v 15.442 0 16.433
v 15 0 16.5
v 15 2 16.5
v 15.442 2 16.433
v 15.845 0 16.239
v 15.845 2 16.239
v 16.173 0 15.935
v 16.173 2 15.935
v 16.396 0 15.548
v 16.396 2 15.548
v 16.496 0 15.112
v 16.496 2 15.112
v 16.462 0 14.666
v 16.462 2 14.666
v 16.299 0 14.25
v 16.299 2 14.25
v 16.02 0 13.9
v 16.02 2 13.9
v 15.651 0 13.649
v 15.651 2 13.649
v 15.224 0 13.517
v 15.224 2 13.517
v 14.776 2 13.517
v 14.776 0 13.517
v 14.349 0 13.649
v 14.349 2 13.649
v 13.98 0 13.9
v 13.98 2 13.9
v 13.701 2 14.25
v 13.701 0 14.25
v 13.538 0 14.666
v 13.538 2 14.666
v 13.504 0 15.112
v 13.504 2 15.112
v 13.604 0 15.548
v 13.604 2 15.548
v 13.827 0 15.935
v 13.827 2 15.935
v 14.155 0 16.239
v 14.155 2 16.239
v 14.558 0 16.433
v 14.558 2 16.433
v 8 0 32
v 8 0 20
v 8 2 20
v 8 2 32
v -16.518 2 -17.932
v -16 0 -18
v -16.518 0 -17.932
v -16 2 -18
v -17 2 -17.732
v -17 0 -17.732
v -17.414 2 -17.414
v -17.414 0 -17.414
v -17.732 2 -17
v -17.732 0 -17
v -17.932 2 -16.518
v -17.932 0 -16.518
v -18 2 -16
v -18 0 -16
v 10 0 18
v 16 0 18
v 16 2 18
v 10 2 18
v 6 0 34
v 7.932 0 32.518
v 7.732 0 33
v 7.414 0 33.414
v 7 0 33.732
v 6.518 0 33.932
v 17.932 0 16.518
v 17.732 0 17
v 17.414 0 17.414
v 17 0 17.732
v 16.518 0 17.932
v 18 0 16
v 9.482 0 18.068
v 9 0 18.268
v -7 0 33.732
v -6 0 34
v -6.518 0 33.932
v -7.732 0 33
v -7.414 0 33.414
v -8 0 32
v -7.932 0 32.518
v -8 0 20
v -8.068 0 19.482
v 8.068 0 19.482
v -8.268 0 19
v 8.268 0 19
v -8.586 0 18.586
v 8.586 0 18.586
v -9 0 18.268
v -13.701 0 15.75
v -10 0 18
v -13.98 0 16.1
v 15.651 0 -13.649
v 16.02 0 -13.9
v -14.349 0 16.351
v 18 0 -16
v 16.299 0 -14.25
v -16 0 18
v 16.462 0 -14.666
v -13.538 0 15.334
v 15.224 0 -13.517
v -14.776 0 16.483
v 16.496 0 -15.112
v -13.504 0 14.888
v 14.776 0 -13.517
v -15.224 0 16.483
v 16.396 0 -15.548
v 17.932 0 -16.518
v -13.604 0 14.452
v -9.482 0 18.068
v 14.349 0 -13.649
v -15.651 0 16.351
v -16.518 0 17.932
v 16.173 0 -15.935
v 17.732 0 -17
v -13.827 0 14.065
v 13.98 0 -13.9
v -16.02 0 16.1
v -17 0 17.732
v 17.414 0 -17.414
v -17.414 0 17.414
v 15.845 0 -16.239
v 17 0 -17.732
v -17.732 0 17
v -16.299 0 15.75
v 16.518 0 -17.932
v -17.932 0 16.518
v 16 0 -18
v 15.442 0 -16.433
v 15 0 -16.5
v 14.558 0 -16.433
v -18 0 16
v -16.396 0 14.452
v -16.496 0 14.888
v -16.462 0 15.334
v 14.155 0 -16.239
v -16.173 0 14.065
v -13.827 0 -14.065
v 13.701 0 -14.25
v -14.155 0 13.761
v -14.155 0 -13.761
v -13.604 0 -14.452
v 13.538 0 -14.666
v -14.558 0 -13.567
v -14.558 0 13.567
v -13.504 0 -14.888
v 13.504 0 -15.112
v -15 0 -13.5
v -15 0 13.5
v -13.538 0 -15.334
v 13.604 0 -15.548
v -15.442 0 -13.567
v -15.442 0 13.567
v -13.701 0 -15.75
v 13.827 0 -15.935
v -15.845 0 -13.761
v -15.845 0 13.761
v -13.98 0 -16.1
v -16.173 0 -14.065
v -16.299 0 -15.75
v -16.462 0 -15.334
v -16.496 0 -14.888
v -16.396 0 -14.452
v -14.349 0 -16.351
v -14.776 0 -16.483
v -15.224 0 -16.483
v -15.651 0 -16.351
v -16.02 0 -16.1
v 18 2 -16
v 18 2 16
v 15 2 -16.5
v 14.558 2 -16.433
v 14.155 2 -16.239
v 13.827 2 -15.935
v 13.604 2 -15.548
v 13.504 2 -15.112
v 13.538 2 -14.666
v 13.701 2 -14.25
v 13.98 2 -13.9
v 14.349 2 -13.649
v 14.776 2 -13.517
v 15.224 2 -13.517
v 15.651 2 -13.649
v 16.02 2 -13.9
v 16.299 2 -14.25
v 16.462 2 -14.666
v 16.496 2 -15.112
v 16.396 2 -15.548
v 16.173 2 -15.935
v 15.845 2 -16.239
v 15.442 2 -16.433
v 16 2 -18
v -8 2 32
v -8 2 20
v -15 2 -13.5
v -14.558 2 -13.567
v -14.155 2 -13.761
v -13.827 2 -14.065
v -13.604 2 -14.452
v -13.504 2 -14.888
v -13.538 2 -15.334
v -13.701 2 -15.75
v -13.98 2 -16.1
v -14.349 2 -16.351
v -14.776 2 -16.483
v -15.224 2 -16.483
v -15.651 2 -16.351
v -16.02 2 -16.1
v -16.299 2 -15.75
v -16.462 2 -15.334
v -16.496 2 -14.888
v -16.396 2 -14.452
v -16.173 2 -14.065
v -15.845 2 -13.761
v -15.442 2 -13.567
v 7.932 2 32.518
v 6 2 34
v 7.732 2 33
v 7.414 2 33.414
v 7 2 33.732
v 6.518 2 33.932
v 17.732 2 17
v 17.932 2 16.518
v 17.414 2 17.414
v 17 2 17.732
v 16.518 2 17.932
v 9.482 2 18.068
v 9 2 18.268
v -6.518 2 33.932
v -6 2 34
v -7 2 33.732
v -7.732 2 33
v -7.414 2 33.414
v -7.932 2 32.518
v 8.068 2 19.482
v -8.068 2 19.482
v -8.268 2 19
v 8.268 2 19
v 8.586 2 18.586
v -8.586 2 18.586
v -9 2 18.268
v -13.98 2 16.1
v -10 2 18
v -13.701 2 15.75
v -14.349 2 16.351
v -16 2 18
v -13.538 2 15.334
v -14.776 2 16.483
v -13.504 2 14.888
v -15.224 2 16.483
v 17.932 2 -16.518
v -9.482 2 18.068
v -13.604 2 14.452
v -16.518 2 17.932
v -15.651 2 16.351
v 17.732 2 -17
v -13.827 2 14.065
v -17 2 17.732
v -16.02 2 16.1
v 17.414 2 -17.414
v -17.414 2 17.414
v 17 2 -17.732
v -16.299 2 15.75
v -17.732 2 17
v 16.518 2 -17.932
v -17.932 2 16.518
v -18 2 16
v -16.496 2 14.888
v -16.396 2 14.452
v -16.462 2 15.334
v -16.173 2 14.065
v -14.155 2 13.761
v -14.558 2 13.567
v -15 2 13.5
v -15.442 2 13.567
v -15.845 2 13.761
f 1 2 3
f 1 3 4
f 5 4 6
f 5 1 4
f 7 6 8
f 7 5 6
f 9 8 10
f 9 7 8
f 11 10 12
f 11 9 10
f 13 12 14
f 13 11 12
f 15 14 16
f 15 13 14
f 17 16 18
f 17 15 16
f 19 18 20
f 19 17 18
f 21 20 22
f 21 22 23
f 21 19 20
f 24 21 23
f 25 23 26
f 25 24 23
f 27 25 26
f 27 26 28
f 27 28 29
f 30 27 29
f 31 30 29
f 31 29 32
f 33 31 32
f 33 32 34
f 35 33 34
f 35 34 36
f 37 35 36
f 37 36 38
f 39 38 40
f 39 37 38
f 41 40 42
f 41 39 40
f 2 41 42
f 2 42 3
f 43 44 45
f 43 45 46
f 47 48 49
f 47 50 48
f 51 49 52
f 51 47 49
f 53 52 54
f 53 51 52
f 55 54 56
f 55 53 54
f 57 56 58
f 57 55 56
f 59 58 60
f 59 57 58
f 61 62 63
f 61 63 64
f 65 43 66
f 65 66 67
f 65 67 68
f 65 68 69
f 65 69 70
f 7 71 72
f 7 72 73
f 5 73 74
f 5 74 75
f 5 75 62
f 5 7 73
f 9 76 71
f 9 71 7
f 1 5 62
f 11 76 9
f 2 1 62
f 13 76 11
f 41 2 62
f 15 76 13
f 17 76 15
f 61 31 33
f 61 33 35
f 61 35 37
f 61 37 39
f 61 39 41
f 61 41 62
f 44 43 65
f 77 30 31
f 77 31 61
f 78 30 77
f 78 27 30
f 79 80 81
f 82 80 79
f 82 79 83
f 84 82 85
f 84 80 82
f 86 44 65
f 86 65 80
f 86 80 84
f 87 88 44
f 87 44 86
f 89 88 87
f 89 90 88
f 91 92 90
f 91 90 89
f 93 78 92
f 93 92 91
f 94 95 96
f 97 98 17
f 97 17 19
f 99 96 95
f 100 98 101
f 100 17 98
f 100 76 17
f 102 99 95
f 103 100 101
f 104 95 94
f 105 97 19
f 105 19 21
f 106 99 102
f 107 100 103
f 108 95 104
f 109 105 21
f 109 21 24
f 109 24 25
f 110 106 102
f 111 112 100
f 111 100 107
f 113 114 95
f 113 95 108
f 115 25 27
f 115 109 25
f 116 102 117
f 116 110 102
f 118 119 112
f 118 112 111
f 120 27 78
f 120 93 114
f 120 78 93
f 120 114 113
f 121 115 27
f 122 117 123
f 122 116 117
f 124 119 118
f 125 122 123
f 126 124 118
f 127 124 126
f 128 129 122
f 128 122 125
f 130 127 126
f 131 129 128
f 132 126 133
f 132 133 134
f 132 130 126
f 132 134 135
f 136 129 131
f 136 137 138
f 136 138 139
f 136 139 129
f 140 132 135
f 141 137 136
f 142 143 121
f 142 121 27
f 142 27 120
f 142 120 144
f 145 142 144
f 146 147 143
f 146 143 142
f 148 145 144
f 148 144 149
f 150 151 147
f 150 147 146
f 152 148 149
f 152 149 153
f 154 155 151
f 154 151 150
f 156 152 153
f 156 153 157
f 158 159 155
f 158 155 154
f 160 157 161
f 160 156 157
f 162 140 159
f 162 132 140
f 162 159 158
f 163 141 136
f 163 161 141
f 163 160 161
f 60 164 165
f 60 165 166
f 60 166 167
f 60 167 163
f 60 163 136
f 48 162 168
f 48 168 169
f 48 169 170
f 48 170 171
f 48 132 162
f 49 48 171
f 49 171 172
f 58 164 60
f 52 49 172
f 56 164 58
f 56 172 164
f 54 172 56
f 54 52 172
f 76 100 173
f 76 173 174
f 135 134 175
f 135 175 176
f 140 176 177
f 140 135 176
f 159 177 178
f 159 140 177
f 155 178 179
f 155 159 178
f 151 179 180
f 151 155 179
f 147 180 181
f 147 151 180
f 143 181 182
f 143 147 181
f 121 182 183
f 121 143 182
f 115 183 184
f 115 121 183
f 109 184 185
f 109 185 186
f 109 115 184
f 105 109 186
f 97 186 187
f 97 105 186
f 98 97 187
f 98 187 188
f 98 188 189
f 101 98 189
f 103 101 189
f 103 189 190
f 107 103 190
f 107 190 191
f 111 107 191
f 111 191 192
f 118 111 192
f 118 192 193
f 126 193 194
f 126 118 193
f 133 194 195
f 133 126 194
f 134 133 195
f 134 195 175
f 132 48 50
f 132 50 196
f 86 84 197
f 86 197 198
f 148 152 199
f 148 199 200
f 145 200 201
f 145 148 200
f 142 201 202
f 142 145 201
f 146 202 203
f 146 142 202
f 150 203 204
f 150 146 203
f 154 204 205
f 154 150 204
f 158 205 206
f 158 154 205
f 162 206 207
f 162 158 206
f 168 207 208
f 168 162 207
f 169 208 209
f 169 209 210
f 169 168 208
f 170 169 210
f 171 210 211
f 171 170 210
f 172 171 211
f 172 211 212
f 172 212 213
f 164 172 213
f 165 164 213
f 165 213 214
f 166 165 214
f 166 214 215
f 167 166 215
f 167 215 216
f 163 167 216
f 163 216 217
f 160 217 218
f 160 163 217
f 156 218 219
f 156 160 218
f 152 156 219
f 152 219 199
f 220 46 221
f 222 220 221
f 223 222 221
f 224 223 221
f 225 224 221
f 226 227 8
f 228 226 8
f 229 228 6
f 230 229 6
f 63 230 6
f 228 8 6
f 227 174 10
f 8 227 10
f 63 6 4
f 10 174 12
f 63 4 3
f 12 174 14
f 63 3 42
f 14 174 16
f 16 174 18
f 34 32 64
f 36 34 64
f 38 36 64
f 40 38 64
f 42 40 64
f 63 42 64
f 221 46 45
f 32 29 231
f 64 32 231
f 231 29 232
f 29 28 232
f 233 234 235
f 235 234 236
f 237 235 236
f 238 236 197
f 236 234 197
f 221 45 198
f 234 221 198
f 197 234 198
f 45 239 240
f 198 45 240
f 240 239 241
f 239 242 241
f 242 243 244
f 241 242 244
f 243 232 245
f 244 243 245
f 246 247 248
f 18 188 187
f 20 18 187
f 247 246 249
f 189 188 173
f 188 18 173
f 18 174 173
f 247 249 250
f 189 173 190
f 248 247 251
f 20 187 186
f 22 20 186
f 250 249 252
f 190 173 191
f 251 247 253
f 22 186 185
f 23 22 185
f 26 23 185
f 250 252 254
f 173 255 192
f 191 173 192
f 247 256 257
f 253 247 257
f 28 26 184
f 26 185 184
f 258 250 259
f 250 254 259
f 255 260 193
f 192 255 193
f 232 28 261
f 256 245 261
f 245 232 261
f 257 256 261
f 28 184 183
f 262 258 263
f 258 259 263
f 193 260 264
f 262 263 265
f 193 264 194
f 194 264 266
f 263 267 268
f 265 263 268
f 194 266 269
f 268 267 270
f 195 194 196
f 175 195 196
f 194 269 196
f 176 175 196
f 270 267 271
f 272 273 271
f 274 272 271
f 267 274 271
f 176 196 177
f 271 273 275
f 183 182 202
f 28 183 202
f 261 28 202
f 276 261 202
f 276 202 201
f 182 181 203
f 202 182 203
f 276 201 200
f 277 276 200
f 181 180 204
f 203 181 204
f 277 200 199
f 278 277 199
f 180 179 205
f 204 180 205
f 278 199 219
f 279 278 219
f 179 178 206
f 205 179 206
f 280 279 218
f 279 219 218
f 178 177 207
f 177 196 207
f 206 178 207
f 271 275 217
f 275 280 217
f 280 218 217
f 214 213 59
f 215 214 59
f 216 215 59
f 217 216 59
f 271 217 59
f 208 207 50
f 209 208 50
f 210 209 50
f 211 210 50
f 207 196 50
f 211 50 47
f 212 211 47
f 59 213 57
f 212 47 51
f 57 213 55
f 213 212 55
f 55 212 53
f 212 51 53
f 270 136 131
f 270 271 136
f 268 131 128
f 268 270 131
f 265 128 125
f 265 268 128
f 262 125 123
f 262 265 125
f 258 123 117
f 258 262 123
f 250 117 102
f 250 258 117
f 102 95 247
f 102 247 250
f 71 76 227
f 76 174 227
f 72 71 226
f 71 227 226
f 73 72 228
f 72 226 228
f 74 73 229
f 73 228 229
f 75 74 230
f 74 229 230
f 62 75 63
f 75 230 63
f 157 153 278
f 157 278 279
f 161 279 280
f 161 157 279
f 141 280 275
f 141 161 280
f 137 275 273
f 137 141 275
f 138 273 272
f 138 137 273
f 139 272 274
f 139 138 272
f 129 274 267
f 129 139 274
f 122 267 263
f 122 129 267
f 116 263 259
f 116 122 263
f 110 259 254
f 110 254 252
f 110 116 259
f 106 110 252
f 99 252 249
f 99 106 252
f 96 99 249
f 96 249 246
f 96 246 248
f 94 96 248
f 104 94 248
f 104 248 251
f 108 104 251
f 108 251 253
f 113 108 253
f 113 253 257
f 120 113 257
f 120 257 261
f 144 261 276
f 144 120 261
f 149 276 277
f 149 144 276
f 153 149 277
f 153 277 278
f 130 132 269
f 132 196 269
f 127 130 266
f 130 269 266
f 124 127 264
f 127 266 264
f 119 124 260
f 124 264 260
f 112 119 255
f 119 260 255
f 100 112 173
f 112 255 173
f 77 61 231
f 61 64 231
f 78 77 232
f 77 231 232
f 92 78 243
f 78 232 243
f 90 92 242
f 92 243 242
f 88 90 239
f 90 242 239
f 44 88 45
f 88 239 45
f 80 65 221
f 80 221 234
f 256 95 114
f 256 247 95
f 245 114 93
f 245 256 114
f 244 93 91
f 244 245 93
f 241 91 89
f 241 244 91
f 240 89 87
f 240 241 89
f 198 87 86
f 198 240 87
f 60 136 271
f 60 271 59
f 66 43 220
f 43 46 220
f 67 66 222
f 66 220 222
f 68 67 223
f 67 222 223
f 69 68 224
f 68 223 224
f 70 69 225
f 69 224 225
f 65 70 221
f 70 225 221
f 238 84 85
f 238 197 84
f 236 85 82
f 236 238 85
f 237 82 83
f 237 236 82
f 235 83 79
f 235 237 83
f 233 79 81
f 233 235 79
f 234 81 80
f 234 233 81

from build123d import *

# Parameters (mm, degrees)
SKETCH1_R           = 1.5
BOSS_EXTRUDE1_DEPTH = 2
FILLET1_R           = 2


with BuildPart() as part:
    # Sketch1 → Boss-Extrude1 (new body)
    with BuildSketch(Plane(origin=(0, 0, 0), x_dir=(1, 0, 0), z_dir=(0, 1, 0))):
        Polygon((-18, 18), (18, 18), (18, -18), (8, -18), (8, -34), (-8, -34), (-8, -18), (-18, -18), align=None)
        with Locations(Location((-15, 15, 0), (0, 0, 270))):
            Circle(SKETCH1_R, mode=Mode.SUBTRACT)
        with Locations(Location((15, 15, 0), (0, 0, 90))):
            Circle(SKETCH1_R, mode=Mode.SUBTRACT)
        with Locations(Location((15, -15, 0), (0, 0, 270))):
            Circle(SKETCH1_R, mode=Mode.SUBTRACT)
        with Locations(Location((-15, -15, 0), (0, 0, 90))):
            Circle(SKETCH1_R, mode=Mode.SUBTRACT)
    extrude(amount=BOSS_EXTRUDE1_DEPTH)

    # Fillet1
    fillet1_edges = [part.edges().sort_by_distance(p)[0] for p in [
        (8, 1, 18),
        (8, 1, 34),
        (-8, 1, 34),
        (-8, 1, 18),
        (-18, 1, 18),
        (-18, 1, -18),
        (18, 1, -18),
        (18, 1, 18),
    ]]
    fillet(fillet1_edges, radius=FILLET1_R)


solid = part.part
